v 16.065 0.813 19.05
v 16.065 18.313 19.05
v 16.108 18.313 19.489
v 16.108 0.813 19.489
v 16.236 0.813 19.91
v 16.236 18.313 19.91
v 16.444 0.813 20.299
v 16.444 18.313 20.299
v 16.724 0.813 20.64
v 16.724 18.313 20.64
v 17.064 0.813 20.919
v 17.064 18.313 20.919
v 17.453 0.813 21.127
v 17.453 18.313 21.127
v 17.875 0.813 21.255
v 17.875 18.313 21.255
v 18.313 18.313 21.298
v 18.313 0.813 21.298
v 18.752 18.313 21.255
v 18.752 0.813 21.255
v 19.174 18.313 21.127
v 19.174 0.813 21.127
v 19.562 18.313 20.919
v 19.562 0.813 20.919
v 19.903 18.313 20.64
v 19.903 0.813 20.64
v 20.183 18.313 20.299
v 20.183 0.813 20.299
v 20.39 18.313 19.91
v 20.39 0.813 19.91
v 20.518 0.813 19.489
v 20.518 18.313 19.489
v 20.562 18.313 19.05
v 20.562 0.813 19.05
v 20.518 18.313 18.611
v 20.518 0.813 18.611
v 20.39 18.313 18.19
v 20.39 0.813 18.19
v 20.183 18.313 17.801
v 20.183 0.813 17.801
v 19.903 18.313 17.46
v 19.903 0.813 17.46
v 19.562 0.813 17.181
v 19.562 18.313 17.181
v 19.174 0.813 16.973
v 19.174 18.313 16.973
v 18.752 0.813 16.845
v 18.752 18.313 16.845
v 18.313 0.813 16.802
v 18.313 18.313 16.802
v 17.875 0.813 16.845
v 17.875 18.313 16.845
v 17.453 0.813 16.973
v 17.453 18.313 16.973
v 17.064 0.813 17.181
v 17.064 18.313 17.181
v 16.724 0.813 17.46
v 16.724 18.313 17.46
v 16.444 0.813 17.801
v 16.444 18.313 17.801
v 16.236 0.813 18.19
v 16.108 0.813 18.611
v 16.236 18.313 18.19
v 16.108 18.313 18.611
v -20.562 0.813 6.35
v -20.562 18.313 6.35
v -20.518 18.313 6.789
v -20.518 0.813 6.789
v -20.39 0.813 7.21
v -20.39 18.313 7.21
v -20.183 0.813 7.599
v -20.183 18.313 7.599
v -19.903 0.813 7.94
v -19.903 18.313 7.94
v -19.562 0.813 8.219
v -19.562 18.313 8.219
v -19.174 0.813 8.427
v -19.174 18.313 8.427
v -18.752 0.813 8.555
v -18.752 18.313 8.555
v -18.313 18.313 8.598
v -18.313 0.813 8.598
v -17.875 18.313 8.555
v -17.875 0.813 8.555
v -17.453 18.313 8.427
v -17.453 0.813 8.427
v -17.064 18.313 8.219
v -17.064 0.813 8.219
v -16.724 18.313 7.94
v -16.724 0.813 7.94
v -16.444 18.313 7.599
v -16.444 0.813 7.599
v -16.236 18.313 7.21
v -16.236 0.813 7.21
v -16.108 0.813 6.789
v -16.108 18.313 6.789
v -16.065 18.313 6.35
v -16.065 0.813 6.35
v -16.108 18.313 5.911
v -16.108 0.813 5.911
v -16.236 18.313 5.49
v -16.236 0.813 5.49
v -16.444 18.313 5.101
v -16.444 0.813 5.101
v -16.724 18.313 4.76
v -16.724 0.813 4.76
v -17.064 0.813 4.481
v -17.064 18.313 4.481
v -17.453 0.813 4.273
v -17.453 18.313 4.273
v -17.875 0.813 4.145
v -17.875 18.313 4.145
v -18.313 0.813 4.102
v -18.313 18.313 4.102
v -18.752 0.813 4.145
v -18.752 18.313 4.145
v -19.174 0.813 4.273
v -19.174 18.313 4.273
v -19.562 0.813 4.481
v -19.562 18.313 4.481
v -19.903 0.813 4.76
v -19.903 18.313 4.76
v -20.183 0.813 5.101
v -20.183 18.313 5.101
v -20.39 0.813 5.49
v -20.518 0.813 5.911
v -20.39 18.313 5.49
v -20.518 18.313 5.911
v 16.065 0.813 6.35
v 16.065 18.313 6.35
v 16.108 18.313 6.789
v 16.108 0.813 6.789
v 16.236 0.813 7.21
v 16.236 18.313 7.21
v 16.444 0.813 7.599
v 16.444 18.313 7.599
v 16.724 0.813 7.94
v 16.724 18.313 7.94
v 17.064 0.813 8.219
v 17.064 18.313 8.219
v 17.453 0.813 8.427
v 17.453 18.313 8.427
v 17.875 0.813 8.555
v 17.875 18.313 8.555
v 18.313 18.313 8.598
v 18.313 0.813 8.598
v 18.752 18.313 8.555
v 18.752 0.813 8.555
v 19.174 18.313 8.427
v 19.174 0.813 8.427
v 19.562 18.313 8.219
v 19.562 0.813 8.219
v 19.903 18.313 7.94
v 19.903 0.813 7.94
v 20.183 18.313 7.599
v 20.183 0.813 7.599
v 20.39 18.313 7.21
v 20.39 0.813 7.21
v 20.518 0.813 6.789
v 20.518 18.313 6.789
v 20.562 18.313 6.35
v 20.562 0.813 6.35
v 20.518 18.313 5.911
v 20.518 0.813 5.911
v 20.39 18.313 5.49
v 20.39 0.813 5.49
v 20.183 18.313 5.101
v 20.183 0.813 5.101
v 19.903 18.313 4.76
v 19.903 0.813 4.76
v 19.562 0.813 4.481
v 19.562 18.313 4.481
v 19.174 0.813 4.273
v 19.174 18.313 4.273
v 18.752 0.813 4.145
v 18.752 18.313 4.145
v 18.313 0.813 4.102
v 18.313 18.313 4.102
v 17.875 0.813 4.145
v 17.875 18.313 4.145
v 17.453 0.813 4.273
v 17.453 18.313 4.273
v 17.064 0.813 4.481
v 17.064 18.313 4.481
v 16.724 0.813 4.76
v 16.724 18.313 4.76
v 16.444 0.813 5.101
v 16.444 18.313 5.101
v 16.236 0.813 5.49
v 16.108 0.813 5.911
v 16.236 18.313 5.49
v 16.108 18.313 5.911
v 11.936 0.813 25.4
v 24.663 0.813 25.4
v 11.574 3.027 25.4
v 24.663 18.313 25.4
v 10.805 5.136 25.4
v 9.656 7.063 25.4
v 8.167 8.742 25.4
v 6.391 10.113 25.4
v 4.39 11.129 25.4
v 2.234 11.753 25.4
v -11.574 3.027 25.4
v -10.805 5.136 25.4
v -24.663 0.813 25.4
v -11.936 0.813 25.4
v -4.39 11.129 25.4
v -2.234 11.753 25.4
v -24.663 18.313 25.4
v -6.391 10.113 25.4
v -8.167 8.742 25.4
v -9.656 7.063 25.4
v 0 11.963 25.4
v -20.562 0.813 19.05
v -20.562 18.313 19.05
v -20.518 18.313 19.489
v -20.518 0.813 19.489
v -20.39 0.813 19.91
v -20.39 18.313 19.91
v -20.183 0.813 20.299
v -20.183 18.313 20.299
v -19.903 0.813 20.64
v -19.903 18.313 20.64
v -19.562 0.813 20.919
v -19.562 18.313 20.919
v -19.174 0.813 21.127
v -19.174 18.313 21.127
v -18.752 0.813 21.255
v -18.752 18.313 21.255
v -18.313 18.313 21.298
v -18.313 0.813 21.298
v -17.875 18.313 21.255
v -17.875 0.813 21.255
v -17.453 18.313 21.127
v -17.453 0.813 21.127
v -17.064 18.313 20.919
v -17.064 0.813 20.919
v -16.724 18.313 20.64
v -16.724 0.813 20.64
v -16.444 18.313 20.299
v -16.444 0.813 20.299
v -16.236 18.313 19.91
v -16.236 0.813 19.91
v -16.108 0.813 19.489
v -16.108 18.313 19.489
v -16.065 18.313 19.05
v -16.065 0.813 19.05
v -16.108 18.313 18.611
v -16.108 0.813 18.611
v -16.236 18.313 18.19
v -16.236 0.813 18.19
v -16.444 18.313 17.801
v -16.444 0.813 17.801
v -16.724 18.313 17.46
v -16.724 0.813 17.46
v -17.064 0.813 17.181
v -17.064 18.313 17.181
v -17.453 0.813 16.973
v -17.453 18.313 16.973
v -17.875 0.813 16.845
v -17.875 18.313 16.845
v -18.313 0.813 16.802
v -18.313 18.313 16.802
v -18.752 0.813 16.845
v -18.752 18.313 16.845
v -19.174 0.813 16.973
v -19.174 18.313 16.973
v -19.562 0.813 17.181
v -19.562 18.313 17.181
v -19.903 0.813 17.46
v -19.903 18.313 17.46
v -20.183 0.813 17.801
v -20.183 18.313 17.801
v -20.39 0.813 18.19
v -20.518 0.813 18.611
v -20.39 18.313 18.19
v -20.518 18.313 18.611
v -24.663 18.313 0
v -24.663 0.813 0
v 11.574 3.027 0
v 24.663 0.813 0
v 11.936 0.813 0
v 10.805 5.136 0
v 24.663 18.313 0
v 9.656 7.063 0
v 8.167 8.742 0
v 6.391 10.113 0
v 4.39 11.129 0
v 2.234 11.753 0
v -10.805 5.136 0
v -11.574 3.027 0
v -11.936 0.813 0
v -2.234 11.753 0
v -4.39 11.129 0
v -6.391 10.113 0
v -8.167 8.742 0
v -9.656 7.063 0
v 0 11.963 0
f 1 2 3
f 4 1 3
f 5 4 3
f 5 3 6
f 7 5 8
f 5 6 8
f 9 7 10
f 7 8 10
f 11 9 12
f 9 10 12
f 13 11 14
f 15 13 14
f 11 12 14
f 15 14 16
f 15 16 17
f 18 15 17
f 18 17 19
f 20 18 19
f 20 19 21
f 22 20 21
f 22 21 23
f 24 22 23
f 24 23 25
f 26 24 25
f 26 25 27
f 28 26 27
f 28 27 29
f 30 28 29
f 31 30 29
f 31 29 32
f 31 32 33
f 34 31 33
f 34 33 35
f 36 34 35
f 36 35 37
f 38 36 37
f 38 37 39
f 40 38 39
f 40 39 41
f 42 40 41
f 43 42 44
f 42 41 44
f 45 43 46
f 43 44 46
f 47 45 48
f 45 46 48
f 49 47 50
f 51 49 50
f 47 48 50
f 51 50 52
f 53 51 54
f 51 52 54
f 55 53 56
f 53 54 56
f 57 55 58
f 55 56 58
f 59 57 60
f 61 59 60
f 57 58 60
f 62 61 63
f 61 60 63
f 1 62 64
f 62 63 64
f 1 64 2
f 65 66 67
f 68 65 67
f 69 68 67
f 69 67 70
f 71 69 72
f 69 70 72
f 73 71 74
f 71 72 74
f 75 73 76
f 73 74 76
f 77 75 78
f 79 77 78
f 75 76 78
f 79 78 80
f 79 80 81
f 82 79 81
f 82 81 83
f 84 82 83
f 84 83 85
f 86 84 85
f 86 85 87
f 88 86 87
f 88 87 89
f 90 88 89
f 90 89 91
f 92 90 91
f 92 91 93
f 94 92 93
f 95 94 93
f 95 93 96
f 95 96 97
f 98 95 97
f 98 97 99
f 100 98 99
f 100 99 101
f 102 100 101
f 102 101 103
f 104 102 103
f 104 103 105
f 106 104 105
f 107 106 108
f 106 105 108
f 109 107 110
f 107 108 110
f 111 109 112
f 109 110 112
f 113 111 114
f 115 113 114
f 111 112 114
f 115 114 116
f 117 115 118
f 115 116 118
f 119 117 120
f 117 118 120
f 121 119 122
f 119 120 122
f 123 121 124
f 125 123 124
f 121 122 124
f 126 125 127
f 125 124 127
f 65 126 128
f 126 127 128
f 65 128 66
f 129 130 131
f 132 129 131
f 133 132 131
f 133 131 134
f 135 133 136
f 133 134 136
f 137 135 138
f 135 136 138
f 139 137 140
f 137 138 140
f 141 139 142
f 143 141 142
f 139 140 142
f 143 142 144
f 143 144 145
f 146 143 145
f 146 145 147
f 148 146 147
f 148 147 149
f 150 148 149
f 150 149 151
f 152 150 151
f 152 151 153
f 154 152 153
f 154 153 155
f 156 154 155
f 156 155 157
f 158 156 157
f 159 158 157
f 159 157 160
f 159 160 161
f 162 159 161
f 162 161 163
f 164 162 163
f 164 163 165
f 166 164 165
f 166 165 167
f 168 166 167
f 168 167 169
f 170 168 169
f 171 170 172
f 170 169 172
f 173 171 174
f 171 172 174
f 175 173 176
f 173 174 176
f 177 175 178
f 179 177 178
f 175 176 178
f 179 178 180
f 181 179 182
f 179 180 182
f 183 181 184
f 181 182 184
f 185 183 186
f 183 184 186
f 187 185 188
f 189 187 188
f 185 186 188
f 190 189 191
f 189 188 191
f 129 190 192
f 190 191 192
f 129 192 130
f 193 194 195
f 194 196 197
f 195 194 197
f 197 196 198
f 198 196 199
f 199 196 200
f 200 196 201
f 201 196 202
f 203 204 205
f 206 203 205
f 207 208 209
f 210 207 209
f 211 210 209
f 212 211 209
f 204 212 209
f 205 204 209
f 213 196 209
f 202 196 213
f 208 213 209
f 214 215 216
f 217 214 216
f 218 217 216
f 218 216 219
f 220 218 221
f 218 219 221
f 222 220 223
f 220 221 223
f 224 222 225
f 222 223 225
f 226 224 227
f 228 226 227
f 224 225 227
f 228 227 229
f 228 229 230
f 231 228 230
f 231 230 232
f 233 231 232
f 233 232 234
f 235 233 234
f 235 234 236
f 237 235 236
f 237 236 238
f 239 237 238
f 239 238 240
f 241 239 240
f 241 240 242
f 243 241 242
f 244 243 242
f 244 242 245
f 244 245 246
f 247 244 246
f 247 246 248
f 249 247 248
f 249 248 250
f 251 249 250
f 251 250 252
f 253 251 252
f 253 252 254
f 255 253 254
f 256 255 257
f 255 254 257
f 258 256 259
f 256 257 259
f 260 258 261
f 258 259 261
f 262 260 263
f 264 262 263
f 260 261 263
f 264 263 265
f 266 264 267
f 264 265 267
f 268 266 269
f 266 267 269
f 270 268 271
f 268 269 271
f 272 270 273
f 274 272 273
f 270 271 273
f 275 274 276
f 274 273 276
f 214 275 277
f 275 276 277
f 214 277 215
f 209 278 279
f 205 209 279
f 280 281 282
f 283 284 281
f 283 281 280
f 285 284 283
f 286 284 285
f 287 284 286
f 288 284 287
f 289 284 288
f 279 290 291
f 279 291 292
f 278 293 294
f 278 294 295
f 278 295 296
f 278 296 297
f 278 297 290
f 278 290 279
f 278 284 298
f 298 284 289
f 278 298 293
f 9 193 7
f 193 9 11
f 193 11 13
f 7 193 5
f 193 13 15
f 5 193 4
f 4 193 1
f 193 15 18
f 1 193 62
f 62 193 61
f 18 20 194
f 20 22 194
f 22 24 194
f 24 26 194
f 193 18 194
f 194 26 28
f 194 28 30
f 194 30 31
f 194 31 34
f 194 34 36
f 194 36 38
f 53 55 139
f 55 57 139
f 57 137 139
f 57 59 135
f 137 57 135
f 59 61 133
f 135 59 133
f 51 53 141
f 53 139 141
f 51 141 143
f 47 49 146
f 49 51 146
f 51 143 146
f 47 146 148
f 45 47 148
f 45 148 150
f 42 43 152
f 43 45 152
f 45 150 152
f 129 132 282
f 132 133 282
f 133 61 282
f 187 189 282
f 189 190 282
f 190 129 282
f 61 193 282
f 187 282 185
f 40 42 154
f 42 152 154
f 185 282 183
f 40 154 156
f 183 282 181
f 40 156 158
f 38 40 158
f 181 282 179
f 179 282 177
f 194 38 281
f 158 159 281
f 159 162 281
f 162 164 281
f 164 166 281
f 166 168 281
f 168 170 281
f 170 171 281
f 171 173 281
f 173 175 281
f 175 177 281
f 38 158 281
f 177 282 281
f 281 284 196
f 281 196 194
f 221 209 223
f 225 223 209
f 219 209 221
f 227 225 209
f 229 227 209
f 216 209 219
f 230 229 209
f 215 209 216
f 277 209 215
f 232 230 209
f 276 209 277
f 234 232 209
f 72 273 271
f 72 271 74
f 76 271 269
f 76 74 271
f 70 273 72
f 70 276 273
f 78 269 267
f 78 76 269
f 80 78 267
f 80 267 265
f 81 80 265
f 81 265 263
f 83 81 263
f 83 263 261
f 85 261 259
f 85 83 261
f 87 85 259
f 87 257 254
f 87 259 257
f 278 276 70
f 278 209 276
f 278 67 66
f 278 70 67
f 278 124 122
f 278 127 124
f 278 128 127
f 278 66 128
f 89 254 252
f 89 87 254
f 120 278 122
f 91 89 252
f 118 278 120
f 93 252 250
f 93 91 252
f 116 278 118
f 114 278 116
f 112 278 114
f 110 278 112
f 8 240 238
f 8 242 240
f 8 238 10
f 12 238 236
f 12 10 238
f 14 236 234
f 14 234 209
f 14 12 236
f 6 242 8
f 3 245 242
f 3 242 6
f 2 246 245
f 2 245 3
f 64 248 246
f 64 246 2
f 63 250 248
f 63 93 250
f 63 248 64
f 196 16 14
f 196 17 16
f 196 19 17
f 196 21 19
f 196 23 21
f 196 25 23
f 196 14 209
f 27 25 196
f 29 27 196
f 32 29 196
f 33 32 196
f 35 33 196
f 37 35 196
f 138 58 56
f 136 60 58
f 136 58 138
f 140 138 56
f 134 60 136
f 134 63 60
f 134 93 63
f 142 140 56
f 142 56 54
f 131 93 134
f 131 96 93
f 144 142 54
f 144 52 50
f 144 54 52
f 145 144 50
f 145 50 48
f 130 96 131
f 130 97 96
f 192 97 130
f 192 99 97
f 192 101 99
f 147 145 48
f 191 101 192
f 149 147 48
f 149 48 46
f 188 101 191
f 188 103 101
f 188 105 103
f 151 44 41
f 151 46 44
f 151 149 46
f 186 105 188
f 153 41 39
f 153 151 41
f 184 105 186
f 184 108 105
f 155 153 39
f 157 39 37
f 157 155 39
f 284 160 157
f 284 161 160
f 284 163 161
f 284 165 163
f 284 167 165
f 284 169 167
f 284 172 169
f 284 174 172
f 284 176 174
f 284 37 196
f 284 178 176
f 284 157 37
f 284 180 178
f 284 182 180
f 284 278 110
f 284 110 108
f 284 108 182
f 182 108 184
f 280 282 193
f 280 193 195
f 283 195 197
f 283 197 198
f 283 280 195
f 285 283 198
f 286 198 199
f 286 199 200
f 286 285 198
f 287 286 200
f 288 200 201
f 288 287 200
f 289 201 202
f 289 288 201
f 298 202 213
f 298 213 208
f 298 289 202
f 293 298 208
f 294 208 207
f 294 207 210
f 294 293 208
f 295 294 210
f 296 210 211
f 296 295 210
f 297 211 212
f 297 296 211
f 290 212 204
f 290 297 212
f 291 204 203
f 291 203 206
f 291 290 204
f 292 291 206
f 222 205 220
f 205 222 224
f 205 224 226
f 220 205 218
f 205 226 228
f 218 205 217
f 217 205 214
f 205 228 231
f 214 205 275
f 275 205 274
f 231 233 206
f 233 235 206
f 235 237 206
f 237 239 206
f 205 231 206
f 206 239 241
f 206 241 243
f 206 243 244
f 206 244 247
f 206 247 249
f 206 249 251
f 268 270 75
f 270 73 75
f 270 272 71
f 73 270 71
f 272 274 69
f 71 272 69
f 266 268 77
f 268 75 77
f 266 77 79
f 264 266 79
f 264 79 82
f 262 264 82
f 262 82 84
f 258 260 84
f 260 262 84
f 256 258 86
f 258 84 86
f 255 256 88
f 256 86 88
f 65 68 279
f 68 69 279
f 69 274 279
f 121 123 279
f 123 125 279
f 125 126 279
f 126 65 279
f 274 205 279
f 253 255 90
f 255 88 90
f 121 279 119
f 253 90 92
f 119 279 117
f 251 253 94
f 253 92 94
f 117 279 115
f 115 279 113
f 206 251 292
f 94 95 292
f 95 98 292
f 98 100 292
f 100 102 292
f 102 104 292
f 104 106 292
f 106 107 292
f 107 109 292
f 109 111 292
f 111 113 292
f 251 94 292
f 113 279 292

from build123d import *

# Parameters (mm, degrees)
PAD_DEPTH    = 25.4
SKETCH001_R  = 2.248154
POCKET_DEPTH = 17.5016


with BuildPart() as part:
    # Sketch → Pad (new body)
    with BuildSketch(Plane.XY):
        with BuildLine():
            ThreePointArc((11.935765, 0.8128), (0, 11.963408), (-11.935765, 0.8128))
            Line((-24.6634, 0.8128), (-11.935765, 0.8128))
            Line((-24.6634, 18.3134), (-24.6634, 0.8128))
            Line((-24.6634, 18.3134), (24.6634, 18.3134))
            Line((24.6634, 18.3134), (24.6634, 0.8128))
            Line((11.935765, 0.8128), (24.6634, 0.8128))
        make_face()
    extrude(amount=PAD_DEPTH)

    # Sketch001 → Pocket (cut, through all)
    with BuildSketch(Plane(origin=(0, 18.3134, 0), x_dir=(-1, 0, 0), z_dir=(0, 1, 0))):
        with Locations((18.3134, 6.35)):
            Circle(SKETCH001_R)
        with Locations((18.3134, 19.05)):
            Circle(SKETCH001_R)
        with Locations((-18.3134, 19.05)):
            Circle(SKETCH001_R)
        with Locations((-18.3134, 6.35)):
            Circle(SKETCH001_R)
    extrude(amount=-POCKET_DEPTH, mode=Mode.SUBTRACT)


solid = part.part
